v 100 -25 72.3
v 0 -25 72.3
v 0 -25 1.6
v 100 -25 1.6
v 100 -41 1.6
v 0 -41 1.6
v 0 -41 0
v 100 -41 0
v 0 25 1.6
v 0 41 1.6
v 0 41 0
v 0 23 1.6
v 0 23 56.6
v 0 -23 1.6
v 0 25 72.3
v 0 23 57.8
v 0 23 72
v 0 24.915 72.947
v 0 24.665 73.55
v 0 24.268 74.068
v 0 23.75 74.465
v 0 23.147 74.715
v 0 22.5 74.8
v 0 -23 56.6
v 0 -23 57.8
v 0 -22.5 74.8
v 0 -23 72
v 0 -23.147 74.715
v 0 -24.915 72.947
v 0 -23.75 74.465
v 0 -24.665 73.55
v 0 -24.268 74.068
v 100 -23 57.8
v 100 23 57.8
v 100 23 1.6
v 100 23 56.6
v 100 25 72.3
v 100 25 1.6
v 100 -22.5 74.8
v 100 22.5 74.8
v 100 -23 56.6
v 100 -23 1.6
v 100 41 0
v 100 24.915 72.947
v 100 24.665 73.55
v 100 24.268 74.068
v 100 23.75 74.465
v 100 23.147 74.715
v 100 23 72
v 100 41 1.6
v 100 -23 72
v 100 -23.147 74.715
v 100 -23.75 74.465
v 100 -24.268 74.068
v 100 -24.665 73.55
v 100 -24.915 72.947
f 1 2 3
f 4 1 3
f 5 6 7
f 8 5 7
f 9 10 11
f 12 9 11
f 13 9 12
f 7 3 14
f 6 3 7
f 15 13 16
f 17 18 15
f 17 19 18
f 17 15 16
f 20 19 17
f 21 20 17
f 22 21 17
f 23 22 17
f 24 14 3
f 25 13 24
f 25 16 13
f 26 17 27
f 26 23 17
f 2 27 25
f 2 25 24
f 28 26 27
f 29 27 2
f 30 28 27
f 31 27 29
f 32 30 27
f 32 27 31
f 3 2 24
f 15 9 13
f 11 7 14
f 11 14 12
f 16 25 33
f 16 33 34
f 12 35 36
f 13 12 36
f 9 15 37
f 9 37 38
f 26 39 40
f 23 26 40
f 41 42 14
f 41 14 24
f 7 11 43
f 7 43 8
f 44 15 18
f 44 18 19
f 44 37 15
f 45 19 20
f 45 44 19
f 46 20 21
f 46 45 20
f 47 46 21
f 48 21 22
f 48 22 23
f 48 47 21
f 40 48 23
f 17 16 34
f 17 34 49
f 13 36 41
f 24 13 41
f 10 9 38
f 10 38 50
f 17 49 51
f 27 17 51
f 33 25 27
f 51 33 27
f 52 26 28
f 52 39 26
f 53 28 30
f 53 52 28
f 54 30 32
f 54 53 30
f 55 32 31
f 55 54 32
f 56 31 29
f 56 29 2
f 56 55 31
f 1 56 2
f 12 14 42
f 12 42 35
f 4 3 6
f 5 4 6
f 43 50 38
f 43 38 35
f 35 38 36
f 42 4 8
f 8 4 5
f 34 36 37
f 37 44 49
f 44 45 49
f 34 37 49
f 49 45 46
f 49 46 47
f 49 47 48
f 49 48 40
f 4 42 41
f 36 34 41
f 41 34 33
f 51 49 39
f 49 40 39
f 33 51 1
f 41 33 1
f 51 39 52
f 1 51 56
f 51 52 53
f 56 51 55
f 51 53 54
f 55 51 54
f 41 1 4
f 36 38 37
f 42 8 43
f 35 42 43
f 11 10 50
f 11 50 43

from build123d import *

# Parameters (mm, degrees)
F1_DEPTH = 100
F3_R     = 2.5


with BuildPart() as f1:
    # F0 (on Right) → F1 (new body)
    with BuildSketch(Plane.YZ):
        Polygon((-41, 0), (0, 0), (0, 1.6), (-23, 1.6), (-23, 56.6), (0, 56.6), (0, 57.8), (-23, 57.8), (-23, 72), (0, 72), (0, 74.8), (-25, 74.8), (-25, 1.6), (-41, 1.6), align=None)
    extrude(amount=F1_DEPTH)

    # F2: F1 across plane


with BuildPart() as f1_1:
    add(f1.part)
    add(f1.part.mirror(Plane.XZ))

    # F3
    f3_edges = [f1_1.edges().sort_by_distance(p)[0] for p in [
        (50, -25, 74.8),
        (50, 25, 74.8),
    ]]
    fillet(f3_edges, radius=F3_R)


solid = f1_1.part
